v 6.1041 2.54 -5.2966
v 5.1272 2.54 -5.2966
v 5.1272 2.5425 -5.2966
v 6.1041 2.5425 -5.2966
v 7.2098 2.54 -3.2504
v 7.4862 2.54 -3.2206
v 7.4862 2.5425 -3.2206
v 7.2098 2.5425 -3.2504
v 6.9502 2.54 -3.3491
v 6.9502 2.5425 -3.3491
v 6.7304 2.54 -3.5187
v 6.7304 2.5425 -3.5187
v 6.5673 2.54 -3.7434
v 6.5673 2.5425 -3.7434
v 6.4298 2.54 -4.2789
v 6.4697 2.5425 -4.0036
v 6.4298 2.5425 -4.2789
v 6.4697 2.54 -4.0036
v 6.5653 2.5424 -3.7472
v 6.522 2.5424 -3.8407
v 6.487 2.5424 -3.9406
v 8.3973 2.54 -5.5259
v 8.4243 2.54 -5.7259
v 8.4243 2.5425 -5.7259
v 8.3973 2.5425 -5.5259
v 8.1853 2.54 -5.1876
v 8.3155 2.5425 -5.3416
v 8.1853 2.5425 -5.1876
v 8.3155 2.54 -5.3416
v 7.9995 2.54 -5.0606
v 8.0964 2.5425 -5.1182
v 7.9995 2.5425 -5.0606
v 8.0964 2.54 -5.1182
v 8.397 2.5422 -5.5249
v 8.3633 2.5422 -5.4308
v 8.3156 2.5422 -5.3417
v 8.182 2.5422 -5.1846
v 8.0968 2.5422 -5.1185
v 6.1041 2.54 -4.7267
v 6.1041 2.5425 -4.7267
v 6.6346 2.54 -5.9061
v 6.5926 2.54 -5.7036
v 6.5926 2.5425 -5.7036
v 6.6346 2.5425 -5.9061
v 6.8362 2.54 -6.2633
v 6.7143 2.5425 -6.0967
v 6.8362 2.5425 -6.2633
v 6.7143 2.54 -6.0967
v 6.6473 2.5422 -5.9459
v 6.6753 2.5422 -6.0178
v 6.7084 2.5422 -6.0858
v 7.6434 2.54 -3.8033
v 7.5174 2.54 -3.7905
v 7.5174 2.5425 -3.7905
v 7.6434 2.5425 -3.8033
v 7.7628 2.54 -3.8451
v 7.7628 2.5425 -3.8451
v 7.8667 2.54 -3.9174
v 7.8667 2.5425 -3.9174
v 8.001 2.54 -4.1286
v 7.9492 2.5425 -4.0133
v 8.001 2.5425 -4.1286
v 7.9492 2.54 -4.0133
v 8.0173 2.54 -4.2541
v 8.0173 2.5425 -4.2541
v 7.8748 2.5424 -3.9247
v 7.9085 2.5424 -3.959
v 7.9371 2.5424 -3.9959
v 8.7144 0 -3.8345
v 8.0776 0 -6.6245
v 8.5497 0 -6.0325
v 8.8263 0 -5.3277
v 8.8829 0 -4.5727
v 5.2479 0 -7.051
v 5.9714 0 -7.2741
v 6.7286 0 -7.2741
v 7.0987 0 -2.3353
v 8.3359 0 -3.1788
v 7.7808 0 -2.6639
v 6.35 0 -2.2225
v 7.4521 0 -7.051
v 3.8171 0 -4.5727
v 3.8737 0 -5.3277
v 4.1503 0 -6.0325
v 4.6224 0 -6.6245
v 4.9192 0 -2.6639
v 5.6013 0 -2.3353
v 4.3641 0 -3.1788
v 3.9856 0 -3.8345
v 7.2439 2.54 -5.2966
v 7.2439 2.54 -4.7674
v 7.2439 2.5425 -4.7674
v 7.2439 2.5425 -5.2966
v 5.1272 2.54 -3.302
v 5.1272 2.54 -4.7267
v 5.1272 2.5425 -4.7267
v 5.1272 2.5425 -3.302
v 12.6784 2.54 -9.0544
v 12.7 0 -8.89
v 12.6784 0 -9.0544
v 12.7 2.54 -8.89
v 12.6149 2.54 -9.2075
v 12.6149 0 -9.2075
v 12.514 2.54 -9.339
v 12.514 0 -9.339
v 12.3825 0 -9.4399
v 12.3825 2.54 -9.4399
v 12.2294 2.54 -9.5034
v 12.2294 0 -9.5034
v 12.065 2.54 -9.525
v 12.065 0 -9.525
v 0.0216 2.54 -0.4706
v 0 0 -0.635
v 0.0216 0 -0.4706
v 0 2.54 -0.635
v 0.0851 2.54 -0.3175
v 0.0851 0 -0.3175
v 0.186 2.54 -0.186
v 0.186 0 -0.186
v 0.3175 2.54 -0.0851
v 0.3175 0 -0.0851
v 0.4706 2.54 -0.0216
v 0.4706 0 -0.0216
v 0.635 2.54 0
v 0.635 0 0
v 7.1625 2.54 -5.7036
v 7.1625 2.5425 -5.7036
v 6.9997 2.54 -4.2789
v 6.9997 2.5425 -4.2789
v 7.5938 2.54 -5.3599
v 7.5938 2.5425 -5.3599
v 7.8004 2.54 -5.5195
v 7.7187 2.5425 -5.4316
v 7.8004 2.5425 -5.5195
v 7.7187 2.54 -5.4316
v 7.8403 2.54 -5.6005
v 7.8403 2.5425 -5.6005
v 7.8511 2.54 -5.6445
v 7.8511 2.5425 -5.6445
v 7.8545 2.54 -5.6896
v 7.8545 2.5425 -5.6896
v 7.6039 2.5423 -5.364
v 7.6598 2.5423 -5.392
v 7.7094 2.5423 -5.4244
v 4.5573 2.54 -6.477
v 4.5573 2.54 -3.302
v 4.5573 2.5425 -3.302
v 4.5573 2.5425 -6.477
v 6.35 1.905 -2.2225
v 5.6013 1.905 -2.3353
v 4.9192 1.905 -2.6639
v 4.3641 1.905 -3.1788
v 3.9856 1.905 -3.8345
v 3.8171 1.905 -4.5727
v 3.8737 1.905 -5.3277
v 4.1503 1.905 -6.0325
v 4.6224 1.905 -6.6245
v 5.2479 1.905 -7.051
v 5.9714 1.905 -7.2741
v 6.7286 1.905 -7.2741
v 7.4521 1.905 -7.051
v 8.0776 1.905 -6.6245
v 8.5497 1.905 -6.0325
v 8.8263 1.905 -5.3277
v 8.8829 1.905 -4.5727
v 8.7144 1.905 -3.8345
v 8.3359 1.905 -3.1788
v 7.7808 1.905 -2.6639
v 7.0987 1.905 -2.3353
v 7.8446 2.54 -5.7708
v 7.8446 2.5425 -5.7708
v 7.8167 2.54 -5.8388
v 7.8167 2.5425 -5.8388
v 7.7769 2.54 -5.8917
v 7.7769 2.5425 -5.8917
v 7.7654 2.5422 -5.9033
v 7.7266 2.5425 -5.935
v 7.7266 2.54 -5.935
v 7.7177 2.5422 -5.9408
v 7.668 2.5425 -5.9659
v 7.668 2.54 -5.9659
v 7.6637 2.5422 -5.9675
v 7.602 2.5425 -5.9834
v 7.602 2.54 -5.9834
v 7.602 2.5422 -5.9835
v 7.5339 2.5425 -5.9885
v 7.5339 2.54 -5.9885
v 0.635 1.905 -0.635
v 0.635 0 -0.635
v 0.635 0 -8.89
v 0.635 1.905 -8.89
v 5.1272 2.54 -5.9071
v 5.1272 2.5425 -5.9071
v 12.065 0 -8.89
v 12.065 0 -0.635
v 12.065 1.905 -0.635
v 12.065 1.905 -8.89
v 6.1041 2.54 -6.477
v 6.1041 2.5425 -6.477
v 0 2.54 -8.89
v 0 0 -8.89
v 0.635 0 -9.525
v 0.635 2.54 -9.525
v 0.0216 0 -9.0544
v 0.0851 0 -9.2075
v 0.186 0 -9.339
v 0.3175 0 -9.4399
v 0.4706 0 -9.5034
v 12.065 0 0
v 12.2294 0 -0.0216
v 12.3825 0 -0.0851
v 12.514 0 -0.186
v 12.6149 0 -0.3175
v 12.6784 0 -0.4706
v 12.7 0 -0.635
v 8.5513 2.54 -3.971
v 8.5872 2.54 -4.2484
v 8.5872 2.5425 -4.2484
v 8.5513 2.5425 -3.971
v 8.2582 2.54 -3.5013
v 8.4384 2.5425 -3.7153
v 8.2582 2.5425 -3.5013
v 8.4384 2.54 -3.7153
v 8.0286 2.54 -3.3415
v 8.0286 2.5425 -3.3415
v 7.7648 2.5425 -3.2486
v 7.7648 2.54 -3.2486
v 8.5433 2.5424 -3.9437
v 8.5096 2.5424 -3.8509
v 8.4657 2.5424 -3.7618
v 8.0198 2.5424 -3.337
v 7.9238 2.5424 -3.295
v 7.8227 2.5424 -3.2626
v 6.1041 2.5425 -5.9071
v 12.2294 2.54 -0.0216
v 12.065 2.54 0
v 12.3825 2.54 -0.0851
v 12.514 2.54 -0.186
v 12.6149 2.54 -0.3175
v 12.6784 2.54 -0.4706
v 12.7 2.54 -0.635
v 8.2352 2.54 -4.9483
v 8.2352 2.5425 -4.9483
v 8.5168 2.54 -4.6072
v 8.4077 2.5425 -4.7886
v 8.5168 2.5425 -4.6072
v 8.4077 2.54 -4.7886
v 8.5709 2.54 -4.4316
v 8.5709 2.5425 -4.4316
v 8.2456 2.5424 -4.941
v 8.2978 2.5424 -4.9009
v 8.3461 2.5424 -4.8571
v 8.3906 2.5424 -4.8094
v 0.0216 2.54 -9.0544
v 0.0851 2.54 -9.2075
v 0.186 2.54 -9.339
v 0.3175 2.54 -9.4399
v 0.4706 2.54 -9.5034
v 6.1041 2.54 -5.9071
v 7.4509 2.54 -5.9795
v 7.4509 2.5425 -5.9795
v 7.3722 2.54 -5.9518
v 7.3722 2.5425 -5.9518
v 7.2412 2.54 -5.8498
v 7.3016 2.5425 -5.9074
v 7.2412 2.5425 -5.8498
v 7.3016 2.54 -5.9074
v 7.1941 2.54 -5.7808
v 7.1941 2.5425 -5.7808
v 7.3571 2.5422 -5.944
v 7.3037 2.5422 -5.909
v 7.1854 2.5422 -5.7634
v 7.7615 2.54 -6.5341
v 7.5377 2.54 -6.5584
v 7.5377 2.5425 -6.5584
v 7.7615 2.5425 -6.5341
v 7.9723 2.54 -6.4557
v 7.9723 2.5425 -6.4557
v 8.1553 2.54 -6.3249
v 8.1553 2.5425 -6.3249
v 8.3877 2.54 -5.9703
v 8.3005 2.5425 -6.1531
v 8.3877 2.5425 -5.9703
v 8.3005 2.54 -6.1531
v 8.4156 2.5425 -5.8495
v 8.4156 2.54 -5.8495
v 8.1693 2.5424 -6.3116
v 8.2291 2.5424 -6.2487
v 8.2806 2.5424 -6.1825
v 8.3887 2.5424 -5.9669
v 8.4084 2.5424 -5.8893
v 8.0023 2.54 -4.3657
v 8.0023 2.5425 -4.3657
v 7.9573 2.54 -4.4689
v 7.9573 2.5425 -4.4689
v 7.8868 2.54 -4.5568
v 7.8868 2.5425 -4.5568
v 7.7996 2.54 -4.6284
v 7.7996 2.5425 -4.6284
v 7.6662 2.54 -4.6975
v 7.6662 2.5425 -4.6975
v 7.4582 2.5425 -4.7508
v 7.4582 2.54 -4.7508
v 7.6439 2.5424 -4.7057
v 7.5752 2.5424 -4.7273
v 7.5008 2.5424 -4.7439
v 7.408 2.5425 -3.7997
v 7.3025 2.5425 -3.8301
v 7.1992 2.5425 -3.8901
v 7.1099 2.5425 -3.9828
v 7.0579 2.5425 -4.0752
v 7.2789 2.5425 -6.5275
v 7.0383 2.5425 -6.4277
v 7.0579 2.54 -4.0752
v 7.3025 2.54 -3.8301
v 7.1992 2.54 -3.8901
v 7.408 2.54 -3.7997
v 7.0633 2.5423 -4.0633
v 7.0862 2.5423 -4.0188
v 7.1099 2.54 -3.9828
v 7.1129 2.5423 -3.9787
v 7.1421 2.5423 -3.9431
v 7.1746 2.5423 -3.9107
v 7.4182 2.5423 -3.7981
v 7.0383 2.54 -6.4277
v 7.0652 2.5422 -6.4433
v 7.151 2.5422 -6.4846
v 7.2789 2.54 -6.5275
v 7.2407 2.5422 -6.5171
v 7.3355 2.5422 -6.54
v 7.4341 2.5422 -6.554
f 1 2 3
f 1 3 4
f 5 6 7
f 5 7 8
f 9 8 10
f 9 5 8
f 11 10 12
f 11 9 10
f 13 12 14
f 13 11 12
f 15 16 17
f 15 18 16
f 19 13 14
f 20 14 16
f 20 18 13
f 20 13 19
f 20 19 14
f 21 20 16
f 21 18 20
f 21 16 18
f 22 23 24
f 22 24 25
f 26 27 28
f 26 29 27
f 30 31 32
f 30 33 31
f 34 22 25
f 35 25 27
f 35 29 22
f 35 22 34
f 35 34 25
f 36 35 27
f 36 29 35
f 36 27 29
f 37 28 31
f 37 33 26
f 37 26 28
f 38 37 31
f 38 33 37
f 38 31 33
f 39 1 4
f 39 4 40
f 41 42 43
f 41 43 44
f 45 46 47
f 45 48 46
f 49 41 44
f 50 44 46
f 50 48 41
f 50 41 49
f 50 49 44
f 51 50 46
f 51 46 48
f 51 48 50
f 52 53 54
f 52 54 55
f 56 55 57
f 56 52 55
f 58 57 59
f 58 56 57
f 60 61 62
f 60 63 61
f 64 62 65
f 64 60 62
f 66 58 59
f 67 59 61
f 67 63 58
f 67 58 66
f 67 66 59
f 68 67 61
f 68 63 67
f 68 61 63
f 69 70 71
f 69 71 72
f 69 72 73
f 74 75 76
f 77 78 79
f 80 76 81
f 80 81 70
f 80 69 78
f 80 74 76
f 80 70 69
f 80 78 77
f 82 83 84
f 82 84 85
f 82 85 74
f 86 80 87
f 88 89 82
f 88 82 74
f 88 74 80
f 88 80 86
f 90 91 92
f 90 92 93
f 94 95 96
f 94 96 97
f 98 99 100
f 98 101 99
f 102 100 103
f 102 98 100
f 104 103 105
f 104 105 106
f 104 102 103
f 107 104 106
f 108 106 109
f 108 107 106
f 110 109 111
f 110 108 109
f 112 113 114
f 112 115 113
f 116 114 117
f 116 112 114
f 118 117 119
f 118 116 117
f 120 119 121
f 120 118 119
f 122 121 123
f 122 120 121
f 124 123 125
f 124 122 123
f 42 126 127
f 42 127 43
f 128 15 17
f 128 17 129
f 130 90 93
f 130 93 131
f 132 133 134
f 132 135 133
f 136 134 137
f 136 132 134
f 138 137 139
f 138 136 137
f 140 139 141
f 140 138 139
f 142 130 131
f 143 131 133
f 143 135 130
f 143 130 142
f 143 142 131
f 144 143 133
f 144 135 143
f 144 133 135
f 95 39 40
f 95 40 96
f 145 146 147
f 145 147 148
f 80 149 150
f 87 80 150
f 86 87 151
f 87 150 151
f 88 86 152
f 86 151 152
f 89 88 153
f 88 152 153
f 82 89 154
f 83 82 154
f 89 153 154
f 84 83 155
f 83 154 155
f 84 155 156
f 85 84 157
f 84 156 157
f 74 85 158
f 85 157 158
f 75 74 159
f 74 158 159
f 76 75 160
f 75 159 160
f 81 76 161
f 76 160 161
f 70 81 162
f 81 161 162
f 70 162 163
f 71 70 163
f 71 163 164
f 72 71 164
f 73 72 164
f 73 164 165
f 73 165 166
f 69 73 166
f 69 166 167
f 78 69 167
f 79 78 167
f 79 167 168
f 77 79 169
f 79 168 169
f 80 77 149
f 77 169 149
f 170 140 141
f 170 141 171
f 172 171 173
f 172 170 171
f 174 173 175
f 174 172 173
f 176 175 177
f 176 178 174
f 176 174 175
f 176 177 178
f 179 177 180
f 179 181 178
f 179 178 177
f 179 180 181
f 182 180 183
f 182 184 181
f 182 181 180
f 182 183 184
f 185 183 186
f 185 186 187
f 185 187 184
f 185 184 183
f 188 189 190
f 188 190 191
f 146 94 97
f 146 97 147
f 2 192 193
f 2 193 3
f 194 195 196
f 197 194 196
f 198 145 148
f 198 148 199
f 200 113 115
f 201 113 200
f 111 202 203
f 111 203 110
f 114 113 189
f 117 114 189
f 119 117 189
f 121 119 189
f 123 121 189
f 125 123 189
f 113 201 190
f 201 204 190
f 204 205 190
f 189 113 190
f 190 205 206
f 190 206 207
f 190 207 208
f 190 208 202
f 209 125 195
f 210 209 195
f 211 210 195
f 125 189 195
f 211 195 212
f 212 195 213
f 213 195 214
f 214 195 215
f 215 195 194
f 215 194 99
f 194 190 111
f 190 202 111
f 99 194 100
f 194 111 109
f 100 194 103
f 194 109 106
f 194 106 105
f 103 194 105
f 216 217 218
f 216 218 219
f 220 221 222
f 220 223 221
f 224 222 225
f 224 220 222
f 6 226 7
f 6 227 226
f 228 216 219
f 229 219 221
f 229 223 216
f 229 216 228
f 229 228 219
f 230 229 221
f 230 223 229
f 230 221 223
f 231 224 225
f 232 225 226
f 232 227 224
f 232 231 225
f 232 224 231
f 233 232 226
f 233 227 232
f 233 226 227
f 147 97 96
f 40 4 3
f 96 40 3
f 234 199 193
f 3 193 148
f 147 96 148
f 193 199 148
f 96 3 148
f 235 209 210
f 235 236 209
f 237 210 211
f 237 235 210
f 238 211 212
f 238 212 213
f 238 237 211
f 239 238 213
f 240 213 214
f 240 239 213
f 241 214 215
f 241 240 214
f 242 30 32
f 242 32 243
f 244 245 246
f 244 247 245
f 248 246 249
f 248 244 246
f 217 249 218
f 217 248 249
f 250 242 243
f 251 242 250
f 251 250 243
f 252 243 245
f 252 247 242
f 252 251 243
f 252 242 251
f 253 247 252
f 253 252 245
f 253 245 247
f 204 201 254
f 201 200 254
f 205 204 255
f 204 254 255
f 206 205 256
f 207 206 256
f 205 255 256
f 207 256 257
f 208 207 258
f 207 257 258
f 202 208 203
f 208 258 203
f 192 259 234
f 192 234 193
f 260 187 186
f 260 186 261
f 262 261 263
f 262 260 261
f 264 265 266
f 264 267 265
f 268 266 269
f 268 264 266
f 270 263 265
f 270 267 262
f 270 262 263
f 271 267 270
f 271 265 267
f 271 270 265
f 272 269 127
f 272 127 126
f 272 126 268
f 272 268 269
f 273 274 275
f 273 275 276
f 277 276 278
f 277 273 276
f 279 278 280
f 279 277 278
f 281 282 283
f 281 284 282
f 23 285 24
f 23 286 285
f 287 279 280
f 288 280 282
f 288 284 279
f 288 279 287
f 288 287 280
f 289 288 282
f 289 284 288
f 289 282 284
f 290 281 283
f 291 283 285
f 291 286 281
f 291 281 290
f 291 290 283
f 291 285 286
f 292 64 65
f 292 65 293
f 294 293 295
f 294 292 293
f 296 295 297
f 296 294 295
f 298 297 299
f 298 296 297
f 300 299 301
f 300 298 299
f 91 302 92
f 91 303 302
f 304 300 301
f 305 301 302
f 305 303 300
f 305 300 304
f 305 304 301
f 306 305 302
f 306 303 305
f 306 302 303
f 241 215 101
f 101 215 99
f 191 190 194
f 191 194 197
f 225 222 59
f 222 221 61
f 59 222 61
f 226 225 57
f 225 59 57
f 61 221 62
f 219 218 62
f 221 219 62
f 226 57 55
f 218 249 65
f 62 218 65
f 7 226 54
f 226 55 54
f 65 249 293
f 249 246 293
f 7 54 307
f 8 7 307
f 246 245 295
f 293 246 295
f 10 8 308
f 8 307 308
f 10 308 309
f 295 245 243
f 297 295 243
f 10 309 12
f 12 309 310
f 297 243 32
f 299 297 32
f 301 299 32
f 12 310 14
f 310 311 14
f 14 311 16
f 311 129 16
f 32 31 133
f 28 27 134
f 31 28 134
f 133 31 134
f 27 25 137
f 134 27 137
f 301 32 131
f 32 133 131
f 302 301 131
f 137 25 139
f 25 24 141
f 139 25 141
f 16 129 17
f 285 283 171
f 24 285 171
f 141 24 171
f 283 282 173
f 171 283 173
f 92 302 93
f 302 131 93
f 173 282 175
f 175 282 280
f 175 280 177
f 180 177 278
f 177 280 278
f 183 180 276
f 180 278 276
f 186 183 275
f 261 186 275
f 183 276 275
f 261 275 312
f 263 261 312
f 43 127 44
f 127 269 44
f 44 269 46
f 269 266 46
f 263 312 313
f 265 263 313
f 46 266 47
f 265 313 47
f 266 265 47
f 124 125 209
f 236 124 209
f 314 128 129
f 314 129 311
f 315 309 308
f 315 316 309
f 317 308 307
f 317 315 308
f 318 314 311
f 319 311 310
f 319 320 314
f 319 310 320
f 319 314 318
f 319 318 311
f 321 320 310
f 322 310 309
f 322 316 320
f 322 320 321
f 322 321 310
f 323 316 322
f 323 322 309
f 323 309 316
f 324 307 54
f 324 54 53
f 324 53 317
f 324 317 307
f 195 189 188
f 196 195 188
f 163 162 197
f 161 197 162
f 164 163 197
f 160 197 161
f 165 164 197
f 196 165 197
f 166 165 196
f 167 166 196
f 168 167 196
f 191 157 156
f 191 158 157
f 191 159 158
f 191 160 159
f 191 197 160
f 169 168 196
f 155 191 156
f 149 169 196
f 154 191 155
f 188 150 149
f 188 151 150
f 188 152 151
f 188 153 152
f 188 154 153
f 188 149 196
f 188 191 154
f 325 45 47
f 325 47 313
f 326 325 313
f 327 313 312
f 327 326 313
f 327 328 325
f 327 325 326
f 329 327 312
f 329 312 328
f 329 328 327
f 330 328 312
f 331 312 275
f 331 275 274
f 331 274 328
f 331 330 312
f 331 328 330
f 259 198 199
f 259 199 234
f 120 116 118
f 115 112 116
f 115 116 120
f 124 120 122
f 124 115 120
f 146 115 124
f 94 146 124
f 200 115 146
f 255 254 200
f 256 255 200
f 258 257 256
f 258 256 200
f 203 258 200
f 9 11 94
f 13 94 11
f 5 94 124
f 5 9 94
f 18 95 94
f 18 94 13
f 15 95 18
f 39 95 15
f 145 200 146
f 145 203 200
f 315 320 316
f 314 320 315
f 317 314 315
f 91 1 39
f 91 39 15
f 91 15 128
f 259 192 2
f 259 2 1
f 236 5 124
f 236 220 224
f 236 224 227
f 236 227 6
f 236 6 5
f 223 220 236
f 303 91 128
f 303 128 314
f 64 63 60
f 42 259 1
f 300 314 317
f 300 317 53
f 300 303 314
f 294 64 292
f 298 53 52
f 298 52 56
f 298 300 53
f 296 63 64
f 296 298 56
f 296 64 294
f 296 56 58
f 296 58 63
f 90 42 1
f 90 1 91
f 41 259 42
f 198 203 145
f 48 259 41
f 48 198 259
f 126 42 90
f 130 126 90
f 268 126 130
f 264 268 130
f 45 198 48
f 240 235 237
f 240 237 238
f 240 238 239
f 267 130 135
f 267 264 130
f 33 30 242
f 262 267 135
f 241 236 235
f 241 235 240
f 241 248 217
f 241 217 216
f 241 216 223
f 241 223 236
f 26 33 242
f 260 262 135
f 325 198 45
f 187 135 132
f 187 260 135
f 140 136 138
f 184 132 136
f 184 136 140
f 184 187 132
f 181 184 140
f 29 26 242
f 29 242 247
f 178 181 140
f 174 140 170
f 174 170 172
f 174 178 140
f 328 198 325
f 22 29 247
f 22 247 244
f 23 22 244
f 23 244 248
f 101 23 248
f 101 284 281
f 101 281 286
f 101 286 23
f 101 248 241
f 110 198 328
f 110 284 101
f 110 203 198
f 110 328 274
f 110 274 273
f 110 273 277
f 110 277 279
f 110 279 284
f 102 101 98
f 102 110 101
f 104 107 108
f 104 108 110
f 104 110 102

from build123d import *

# Parameters (mm, degrees)
SKETCH1_W           = 12.7
SKETCH1_H           = 9.525
BOSS_EXTRUDE1_DEPTH = 2.54
FILLET1_R           = 0.635
SHELL1_START        = 0.635
SHELL1_OUTLINE_W    = 1.905
SHELL1_OUTLINE_H    = 8.255
SHELL1_DEPTH        = 11.43
SKETCH2_R           = 2.54
BOSS_EXTRUDE2_DEPTH = 1.905
BOSS_EXTRUDE3_DEPTH = 0.00254


# Read off the part's stored shape, not the designer's step: Shell1
with BuildPart() as part:
    # Sketch1 → Boss-Extrude1 (new body)
    with BuildSketch(Plane(origin=(0, 0, 0), x_dir=(1, 0, 0), z_dir=(0, 1, 0))):
        with Locations((6.35, 4.7625)):
            Rectangle(SKETCH1_W, SKETCH1_H)
    extrude(amount=BOSS_EXTRUDE1_DEPTH)

    # Fillet1
    fillet1_edges = [part.edges().sort_by_distance(p)[0] for p in [
        (0, 1.27, -9.525),
        (12.7, 1.27, -9.525),
        (12.7, 1.27, 0),
        (0, 1.27, 0),
    ]]
    fillet(fillet1_edges, radius=FILLET1_R)

    # Shell1 outline → Shell1 (cut)
    with BuildSketch(Plane.YZ.offset(SHELL1_START)):
        with Locations((0.9525, -4.7625)):
            Rectangle(SHELL1_OUTLINE_W, SHELL1_OUTLINE_H)
    extrude(amount=SHELL1_DEPTH, mode=Mode.SUBTRACT)

    # Sketch2 → Boss-Extrude2 (add)
    with BuildSketch(Plane(origin=(0, 1.905, 0), x_dir=(-1, 0, 0), z_dir=(0, -1, 0))):
        with Locations(Location((-6.35, 4.7625, 0), (0, 0, 270))):
            Circle(SKETCH2_R)
    extrude(amount=BOSS_EXTRUDE2_DEPTH)

    # Sketch3 → Boss-Extrude3 (add)
    with BuildSketch(Plane(origin=(0, 2.54, 0), x_dir=(1, 0, 0), z_dir=(0, 1, 0))):
        Polygon((4.557346154, 6.477), (6.104141026, 6.477), (6.104141026, 5.907128205), (5.127217949, 5.907128205), (5.127217949, 5.296551282), (6.104141026, 5.296551282), (6.104141026, 4.726679487), (5.127217949, 4.726679487), (5.127217949, 3.302), (4.557346154, 3.302), align=None)
        with BuildLine():
            Line((7.162474359, 5.703602564), (6.592602564, 5.703602564))
            add(Edge.make_bspline(
                [(6.592602564, 5.703602564), (6.596626076, 5.732088422), (6.604513904, 5.78793306), (6.623388421, 5.868782184), (6.645964381, 5.945473111), (6.674149313, 6.017762976), (6.707205653, 6.085780553), (6.744797255, 6.149759244), (6.787330498, 6.20942444), (6.81993268, 6.245366991), (6.836197316, 6.263298077)],
                knots=[0, 0, 0, 0, 1.111473889, 2.178970933, 3.205615836, 4.199322666, 5.174200091, 6.12565194, 7.064921805, 8, 8, 8, 8], degree=3))
            add(Edge.make_bspline(
                [(6.836197316, 6.263298077), (6.859656898, 6.286956845), (6.905893269, 6.333585791), (6.983159668, 6.39331232), (7.064149124, 6.44500157), (7.150485915, 6.48598118), (7.240826576, 6.519149428), (7.335889528, 6.541428614), (7.435286308, 6.556211051), (7.503112106, 6.557667173), (7.53772476, 6.558410256)],
                knots=[0, 0, 0, 0, 1.01925491, 2.00884431, 2.983262333, 3.955970413, 4.92937149, 5.924503185, 6.940838805, 8, 8, 8, 8], degree=3))
            add(Edge.make_bspline(
                [(7.53772476, 6.558410256), (7.56849719, 6.55768378), (7.628989587, 6.556255673), (7.71789819, 6.544791605), (7.802665103, 6.524684907), (7.884186336, 6.49839585), (7.961262978, 6.462625195), (8.035596185, 6.421103078), (8.105109084, 6.370174475), (8.169964323, 6.31263028), (8.22954623, 6.2503906), (8.281144422, 6.1838615), (8.325504313, 6.114820126), (8.362050997, 6.042692875), (8.39015043, 5.9673577), (8.40965227, 5.8892498), (8.422416697, 5.808541527), (8.423688368, 5.753685202), (8.424333333, 5.725863181)],
                knots=[0, 0, 0, 0, 1.091422571, 2.145516843, 3.172569842, 4.178562979, 5.178154469, 6.181868002, 7.194278174, 8.227918432, 9.254613415, 10.245994977, 11.209837596, 12.161663635, 13.10878368, 14.055455738, 15.013766427, 16, 16, 16, 16], degree=3))
            add(Edge.make_bspline(
                [(8.424333333, 5.725863181), (8.423009825, 5.691407926), (8.420404245, 5.623576121), (8.399023573, 5.524299234), (8.365557006, 5.429372814), (8.317211295, 5.340125024), (8.256766844, 5.256798746), (8.182603526, 5.182179827), (8.096833706, 5.115098345), (8.032445159, 5.079048748), (7.999473558, 5.060588742)],
                knots=[0, 0, 0, 0, 0.992805628, 1.954529043, 2.915727527, 3.886831945, 4.871318353, 5.87440735, 6.911542536, 8, 8, 8, 8], degree=3))
            add(Edge.make_bspline(
                [(7.999473558, 5.060588742), (8.022104759, 5.053158442), (8.066574055, 5.038558236), (8.129781812, 5.009803295), (8.189885167, 4.978378911), (8.245849161, 4.94187206), (8.298230423, 4.901758919), (8.346709632, 4.857696584), (8.391576439, 4.809781133), (8.432098412, 4.757749048), (8.468063246, 4.702432482), (8.500332577, 4.645109215), (8.526892035, 4.584909929), (8.549391202, 4.52252214), (8.566520788, 4.45738514), (8.578581546, 4.389751328), (8.585552961, 4.319774984), (8.58661622, 4.272366053), (8.587153846, 4.248394231)],
                knots=[0, 0, 0, 0, 1.059543567, 2.081955587, 3.086750234, 4.076226789, 5.052108497, 6.020845489, 6.989030705, 7.970690546, 8.952259656, 9.923888338, 10.895517021, 11.877585046, 12.873342345, 13.889638361, 14.932918083, 16, 16, 16, 16], degree=3))
            add(Edge.make_bspline(
                [(8.587153846, 4.248394231), (8.586064006, 4.213165386), (8.583915064, 4.143701278), (8.570253093, 4.041387755), (8.544816966, 3.943840902), (8.511354332, 3.849938294), (8.46671881, 3.760892179), (8.414190304, 3.674659071), (8.349622216, 3.594229511), (8.277865874, 3.517477148), (8.198176272, 3.447697337), (8.111779779, 3.387201381), (8.020576181, 3.335285086), (7.923988457, 3.29313796), (7.822050165, 3.260679852), (7.714988515, 3.237217635), (7.602353665, 3.222863063), (7.525471567, 3.221358258), (7.486207332, 3.220589744)],
                knots=[0, 0, 0, 0, 1.005138573, 1.981928558, 2.936866704, 3.876260664, 4.820238198, 5.773547, 6.751179199, 7.756627054, 8.768222608, 9.766606018, 10.760583154, 11.757261445, 12.767156078, 13.807575856, 14.880313354, 16, 16, 16, 16], degree=3))
            add(Edge.make_bspline(
                [(7.486207332, 3.220589744), (7.449063998, 3.221400012), (7.376435124, 3.222984385), (7.270200196, 3.236697937), (7.169233952, 3.258819009), (7.073278726, 3.290000494), (6.98270576, 3.330437552), (6.896693704, 3.378589014), (6.816958908, 3.437232146), (6.742612971, 3.503719685), (6.67530511, 3.578314929), (6.615147733, 3.659289915), (6.56346732, 3.746952559), (6.52005193, 3.84092833), (6.485240973, 3.941382088), (6.457782192, 4.048109556), (6.438601784, 4.161319247), (6.432760351, 4.239209923), (6.429782051, 4.278923077)],
                knots=[0, 0, 0, 0, 1.066544725, 2.085487077, 3.070979577, 4.031932826, 4.977951092, 5.916076795, 6.857635327, 7.814973522, 8.776389752, 9.738577119, 10.707772778, 11.69409279, 12.707140348, 13.757286496, 14.856535458, 16, 16, 16, 16], degree=3))
            Line((6.429782051, 4.278923077), (6.999653846, 4.278923077))
            add(Edge.make_bspline(
                [(6.999653846, 4.278923077), (7.003265064, 4.258954782), (7.010298859, 4.220061291), (7.024017843, 4.163752162), (7.041895594, 4.111775358), (7.062566722, 4.063668911), (7.084894652, 4.018801199), (7.111872131, 3.978829299), (7.141522391, 3.942667809), (7.184307932, 3.899678631), (7.245472811, 3.855509046), (7.32806566, 3.817123574), (7.419942383, 3.794624972), (7.484173376, 3.791880212), (7.517372196, 3.790461538)],
                knots=[0, 0, 0, 0, 0.928156231, 1.807827665, 2.648129825, 3.438902246, 4.202261636, 4.936546065, 5.639352463, 6.338805438, 7.70633318, 9.064371875, 10.482673459, 12, 12, 12, 12], degree=3))
            add(Edge.make_bspline(
                [(7.517372196, 3.790461538), (7.534988663, 3.790763632), (7.569495381, 3.791355365), (7.620180613, 3.797913931), (7.668465432, 3.808715896), (7.714439772, 3.823395366), (7.758396309, 3.841796999), (7.799495209, 3.865524803), (7.83857417, 3.893111763), (7.875208368, 3.92412683), (7.909059122, 3.95792215), (7.937224941, 3.995344725), (7.96296646, 4.033372751), (7.982005074, 4.074494153), (7.998687001, 4.116496162), (8.008897192, 4.160903319), (8.01660662, 4.206784081), (8.017054661, 4.23818286), (8.017282051, 4.254118389)],
                knots=[0, 0, 0, 0, 1.110435564, 2.175094844, 3.216326037, 4.226890168, 5.215276772, 6.21526065, 7.213097102, 8.228249917, 9.239874822, 10.221364777, 11.178138315, 12.128914389, 13.072518965, 14.022636769, 14.996447288, 16, 16, 16, 16], degree=3))
            add(Edge.make_bspline(
                [(8.017282051, 4.254118389), (8.016678373, 4.271546606), (8.015476588, 4.306242192), (8.005657881, 4.356873103), (7.990152068, 4.40557596), (7.968612599, 4.452135082), (7.939849038, 4.496378862), (7.905908357, 4.539194964), (7.864116592, 4.578354886), (7.818265429, 4.617063282), (7.765096093, 4.65080533), (7.707198004, 4.681944282), (7.643049511, 4.706721274), (7.574216537, 4.728851717), (7.499397041, 4.74501545), (7.419055624, 4.756751894), (7.33332189, 4.765487859), (7.274224512, 4.766741177), (7.243884615, 4.767384615)],
                knots=[0, 0, 0, 0, 0.809814727, 1.612155564, 2.388397, 3.182215007, 3.988903953, 4.837162975, 5.715530372, 6.646997145, 7.623086902, 8.637258368, 9.698941581, 10.815059213, 11.996518529, 13.252603015, 14.589518788, 16, 16, 16, 16], degree=3))
            Line((7.243884615, 4.767384615), (7.243884615, 5.296551282))
            add(Edge.make_bspline(
                [(7.243884615, 5.296551282), (7.281659591, 5.29976832), (7.35232909, 5.30578676), (7.450422144, 5.319861093), (7.53300385, 5.338673756), (7.602059062, 5.361370215), (7.659398085, 5.390518382), (7.709489139, 5.422696672), (7.752629925, 5.460067052), (7.789089675, 5.501515143), (7.818256341, 5.546026507), (7.838898809, 5.592909304), (7.852530015, 5.640712924), (7.853821571, 5.673409158), (7.854461538, 5.689610176)],
                knots=[0, 0, 0, 0, 1.70044513, 3.18119609, 4.440695891, 5.496282586, 6.431922213, 7.318171381, 8.16090191, 8.983045123, 9.787564368, 10.536848927, 11.275007137, 12, 12, 12, 12], degree=3))
            add(Edge.make_bspline(
                [(7.854461538, 5.689610176), (7.853357412, 5.710280916), (7.85120239, 5.750625824), (7.834465326, 5.808367886), (7.805411679, 5.859840149), (7.766455839, 5.9049343), (7.718986794, 5.942600315), (7.663344752, 5.969945199), (7.600737148, 5.98601154), (7.556689325, 5.987677078), (7.533908654, 5.988538462)],
                knots=[0, 0, 0, 0, 1.009664648, 1.970651636, 2.907870547, 3.878035693, 4.867062054, 5.849714035, 6.887914197, 8, 8, 8, 8], degree=3))
            add(Edge.make_bspline(
                [(7.533908654, 5.988538462), (7.513260536, 5.987522119), (7.472288347, 5.985505385), (7.412374743, 5.970453015), (7.355476781, 5.945114223), (7.302772655, 5.910173522), (7.255023163, 5.868211222), (7.215834605, 5.818515587), (7.183239421, 5.764063969), (7.169423181, 5.723835374), (7.162474359, 5.703602564)],
                knots=[0, 0, 0, 0, 0.98818071, 1.960853194, 2.938124878, 3.957524365, 4.978590984, 5.968022688, 6.978025184, 8, 8, 8, 8], degree=3))
        make_face()
    extrude(amount=BOSS_EXTRUDE3_DEPTH)


solid = part.part
